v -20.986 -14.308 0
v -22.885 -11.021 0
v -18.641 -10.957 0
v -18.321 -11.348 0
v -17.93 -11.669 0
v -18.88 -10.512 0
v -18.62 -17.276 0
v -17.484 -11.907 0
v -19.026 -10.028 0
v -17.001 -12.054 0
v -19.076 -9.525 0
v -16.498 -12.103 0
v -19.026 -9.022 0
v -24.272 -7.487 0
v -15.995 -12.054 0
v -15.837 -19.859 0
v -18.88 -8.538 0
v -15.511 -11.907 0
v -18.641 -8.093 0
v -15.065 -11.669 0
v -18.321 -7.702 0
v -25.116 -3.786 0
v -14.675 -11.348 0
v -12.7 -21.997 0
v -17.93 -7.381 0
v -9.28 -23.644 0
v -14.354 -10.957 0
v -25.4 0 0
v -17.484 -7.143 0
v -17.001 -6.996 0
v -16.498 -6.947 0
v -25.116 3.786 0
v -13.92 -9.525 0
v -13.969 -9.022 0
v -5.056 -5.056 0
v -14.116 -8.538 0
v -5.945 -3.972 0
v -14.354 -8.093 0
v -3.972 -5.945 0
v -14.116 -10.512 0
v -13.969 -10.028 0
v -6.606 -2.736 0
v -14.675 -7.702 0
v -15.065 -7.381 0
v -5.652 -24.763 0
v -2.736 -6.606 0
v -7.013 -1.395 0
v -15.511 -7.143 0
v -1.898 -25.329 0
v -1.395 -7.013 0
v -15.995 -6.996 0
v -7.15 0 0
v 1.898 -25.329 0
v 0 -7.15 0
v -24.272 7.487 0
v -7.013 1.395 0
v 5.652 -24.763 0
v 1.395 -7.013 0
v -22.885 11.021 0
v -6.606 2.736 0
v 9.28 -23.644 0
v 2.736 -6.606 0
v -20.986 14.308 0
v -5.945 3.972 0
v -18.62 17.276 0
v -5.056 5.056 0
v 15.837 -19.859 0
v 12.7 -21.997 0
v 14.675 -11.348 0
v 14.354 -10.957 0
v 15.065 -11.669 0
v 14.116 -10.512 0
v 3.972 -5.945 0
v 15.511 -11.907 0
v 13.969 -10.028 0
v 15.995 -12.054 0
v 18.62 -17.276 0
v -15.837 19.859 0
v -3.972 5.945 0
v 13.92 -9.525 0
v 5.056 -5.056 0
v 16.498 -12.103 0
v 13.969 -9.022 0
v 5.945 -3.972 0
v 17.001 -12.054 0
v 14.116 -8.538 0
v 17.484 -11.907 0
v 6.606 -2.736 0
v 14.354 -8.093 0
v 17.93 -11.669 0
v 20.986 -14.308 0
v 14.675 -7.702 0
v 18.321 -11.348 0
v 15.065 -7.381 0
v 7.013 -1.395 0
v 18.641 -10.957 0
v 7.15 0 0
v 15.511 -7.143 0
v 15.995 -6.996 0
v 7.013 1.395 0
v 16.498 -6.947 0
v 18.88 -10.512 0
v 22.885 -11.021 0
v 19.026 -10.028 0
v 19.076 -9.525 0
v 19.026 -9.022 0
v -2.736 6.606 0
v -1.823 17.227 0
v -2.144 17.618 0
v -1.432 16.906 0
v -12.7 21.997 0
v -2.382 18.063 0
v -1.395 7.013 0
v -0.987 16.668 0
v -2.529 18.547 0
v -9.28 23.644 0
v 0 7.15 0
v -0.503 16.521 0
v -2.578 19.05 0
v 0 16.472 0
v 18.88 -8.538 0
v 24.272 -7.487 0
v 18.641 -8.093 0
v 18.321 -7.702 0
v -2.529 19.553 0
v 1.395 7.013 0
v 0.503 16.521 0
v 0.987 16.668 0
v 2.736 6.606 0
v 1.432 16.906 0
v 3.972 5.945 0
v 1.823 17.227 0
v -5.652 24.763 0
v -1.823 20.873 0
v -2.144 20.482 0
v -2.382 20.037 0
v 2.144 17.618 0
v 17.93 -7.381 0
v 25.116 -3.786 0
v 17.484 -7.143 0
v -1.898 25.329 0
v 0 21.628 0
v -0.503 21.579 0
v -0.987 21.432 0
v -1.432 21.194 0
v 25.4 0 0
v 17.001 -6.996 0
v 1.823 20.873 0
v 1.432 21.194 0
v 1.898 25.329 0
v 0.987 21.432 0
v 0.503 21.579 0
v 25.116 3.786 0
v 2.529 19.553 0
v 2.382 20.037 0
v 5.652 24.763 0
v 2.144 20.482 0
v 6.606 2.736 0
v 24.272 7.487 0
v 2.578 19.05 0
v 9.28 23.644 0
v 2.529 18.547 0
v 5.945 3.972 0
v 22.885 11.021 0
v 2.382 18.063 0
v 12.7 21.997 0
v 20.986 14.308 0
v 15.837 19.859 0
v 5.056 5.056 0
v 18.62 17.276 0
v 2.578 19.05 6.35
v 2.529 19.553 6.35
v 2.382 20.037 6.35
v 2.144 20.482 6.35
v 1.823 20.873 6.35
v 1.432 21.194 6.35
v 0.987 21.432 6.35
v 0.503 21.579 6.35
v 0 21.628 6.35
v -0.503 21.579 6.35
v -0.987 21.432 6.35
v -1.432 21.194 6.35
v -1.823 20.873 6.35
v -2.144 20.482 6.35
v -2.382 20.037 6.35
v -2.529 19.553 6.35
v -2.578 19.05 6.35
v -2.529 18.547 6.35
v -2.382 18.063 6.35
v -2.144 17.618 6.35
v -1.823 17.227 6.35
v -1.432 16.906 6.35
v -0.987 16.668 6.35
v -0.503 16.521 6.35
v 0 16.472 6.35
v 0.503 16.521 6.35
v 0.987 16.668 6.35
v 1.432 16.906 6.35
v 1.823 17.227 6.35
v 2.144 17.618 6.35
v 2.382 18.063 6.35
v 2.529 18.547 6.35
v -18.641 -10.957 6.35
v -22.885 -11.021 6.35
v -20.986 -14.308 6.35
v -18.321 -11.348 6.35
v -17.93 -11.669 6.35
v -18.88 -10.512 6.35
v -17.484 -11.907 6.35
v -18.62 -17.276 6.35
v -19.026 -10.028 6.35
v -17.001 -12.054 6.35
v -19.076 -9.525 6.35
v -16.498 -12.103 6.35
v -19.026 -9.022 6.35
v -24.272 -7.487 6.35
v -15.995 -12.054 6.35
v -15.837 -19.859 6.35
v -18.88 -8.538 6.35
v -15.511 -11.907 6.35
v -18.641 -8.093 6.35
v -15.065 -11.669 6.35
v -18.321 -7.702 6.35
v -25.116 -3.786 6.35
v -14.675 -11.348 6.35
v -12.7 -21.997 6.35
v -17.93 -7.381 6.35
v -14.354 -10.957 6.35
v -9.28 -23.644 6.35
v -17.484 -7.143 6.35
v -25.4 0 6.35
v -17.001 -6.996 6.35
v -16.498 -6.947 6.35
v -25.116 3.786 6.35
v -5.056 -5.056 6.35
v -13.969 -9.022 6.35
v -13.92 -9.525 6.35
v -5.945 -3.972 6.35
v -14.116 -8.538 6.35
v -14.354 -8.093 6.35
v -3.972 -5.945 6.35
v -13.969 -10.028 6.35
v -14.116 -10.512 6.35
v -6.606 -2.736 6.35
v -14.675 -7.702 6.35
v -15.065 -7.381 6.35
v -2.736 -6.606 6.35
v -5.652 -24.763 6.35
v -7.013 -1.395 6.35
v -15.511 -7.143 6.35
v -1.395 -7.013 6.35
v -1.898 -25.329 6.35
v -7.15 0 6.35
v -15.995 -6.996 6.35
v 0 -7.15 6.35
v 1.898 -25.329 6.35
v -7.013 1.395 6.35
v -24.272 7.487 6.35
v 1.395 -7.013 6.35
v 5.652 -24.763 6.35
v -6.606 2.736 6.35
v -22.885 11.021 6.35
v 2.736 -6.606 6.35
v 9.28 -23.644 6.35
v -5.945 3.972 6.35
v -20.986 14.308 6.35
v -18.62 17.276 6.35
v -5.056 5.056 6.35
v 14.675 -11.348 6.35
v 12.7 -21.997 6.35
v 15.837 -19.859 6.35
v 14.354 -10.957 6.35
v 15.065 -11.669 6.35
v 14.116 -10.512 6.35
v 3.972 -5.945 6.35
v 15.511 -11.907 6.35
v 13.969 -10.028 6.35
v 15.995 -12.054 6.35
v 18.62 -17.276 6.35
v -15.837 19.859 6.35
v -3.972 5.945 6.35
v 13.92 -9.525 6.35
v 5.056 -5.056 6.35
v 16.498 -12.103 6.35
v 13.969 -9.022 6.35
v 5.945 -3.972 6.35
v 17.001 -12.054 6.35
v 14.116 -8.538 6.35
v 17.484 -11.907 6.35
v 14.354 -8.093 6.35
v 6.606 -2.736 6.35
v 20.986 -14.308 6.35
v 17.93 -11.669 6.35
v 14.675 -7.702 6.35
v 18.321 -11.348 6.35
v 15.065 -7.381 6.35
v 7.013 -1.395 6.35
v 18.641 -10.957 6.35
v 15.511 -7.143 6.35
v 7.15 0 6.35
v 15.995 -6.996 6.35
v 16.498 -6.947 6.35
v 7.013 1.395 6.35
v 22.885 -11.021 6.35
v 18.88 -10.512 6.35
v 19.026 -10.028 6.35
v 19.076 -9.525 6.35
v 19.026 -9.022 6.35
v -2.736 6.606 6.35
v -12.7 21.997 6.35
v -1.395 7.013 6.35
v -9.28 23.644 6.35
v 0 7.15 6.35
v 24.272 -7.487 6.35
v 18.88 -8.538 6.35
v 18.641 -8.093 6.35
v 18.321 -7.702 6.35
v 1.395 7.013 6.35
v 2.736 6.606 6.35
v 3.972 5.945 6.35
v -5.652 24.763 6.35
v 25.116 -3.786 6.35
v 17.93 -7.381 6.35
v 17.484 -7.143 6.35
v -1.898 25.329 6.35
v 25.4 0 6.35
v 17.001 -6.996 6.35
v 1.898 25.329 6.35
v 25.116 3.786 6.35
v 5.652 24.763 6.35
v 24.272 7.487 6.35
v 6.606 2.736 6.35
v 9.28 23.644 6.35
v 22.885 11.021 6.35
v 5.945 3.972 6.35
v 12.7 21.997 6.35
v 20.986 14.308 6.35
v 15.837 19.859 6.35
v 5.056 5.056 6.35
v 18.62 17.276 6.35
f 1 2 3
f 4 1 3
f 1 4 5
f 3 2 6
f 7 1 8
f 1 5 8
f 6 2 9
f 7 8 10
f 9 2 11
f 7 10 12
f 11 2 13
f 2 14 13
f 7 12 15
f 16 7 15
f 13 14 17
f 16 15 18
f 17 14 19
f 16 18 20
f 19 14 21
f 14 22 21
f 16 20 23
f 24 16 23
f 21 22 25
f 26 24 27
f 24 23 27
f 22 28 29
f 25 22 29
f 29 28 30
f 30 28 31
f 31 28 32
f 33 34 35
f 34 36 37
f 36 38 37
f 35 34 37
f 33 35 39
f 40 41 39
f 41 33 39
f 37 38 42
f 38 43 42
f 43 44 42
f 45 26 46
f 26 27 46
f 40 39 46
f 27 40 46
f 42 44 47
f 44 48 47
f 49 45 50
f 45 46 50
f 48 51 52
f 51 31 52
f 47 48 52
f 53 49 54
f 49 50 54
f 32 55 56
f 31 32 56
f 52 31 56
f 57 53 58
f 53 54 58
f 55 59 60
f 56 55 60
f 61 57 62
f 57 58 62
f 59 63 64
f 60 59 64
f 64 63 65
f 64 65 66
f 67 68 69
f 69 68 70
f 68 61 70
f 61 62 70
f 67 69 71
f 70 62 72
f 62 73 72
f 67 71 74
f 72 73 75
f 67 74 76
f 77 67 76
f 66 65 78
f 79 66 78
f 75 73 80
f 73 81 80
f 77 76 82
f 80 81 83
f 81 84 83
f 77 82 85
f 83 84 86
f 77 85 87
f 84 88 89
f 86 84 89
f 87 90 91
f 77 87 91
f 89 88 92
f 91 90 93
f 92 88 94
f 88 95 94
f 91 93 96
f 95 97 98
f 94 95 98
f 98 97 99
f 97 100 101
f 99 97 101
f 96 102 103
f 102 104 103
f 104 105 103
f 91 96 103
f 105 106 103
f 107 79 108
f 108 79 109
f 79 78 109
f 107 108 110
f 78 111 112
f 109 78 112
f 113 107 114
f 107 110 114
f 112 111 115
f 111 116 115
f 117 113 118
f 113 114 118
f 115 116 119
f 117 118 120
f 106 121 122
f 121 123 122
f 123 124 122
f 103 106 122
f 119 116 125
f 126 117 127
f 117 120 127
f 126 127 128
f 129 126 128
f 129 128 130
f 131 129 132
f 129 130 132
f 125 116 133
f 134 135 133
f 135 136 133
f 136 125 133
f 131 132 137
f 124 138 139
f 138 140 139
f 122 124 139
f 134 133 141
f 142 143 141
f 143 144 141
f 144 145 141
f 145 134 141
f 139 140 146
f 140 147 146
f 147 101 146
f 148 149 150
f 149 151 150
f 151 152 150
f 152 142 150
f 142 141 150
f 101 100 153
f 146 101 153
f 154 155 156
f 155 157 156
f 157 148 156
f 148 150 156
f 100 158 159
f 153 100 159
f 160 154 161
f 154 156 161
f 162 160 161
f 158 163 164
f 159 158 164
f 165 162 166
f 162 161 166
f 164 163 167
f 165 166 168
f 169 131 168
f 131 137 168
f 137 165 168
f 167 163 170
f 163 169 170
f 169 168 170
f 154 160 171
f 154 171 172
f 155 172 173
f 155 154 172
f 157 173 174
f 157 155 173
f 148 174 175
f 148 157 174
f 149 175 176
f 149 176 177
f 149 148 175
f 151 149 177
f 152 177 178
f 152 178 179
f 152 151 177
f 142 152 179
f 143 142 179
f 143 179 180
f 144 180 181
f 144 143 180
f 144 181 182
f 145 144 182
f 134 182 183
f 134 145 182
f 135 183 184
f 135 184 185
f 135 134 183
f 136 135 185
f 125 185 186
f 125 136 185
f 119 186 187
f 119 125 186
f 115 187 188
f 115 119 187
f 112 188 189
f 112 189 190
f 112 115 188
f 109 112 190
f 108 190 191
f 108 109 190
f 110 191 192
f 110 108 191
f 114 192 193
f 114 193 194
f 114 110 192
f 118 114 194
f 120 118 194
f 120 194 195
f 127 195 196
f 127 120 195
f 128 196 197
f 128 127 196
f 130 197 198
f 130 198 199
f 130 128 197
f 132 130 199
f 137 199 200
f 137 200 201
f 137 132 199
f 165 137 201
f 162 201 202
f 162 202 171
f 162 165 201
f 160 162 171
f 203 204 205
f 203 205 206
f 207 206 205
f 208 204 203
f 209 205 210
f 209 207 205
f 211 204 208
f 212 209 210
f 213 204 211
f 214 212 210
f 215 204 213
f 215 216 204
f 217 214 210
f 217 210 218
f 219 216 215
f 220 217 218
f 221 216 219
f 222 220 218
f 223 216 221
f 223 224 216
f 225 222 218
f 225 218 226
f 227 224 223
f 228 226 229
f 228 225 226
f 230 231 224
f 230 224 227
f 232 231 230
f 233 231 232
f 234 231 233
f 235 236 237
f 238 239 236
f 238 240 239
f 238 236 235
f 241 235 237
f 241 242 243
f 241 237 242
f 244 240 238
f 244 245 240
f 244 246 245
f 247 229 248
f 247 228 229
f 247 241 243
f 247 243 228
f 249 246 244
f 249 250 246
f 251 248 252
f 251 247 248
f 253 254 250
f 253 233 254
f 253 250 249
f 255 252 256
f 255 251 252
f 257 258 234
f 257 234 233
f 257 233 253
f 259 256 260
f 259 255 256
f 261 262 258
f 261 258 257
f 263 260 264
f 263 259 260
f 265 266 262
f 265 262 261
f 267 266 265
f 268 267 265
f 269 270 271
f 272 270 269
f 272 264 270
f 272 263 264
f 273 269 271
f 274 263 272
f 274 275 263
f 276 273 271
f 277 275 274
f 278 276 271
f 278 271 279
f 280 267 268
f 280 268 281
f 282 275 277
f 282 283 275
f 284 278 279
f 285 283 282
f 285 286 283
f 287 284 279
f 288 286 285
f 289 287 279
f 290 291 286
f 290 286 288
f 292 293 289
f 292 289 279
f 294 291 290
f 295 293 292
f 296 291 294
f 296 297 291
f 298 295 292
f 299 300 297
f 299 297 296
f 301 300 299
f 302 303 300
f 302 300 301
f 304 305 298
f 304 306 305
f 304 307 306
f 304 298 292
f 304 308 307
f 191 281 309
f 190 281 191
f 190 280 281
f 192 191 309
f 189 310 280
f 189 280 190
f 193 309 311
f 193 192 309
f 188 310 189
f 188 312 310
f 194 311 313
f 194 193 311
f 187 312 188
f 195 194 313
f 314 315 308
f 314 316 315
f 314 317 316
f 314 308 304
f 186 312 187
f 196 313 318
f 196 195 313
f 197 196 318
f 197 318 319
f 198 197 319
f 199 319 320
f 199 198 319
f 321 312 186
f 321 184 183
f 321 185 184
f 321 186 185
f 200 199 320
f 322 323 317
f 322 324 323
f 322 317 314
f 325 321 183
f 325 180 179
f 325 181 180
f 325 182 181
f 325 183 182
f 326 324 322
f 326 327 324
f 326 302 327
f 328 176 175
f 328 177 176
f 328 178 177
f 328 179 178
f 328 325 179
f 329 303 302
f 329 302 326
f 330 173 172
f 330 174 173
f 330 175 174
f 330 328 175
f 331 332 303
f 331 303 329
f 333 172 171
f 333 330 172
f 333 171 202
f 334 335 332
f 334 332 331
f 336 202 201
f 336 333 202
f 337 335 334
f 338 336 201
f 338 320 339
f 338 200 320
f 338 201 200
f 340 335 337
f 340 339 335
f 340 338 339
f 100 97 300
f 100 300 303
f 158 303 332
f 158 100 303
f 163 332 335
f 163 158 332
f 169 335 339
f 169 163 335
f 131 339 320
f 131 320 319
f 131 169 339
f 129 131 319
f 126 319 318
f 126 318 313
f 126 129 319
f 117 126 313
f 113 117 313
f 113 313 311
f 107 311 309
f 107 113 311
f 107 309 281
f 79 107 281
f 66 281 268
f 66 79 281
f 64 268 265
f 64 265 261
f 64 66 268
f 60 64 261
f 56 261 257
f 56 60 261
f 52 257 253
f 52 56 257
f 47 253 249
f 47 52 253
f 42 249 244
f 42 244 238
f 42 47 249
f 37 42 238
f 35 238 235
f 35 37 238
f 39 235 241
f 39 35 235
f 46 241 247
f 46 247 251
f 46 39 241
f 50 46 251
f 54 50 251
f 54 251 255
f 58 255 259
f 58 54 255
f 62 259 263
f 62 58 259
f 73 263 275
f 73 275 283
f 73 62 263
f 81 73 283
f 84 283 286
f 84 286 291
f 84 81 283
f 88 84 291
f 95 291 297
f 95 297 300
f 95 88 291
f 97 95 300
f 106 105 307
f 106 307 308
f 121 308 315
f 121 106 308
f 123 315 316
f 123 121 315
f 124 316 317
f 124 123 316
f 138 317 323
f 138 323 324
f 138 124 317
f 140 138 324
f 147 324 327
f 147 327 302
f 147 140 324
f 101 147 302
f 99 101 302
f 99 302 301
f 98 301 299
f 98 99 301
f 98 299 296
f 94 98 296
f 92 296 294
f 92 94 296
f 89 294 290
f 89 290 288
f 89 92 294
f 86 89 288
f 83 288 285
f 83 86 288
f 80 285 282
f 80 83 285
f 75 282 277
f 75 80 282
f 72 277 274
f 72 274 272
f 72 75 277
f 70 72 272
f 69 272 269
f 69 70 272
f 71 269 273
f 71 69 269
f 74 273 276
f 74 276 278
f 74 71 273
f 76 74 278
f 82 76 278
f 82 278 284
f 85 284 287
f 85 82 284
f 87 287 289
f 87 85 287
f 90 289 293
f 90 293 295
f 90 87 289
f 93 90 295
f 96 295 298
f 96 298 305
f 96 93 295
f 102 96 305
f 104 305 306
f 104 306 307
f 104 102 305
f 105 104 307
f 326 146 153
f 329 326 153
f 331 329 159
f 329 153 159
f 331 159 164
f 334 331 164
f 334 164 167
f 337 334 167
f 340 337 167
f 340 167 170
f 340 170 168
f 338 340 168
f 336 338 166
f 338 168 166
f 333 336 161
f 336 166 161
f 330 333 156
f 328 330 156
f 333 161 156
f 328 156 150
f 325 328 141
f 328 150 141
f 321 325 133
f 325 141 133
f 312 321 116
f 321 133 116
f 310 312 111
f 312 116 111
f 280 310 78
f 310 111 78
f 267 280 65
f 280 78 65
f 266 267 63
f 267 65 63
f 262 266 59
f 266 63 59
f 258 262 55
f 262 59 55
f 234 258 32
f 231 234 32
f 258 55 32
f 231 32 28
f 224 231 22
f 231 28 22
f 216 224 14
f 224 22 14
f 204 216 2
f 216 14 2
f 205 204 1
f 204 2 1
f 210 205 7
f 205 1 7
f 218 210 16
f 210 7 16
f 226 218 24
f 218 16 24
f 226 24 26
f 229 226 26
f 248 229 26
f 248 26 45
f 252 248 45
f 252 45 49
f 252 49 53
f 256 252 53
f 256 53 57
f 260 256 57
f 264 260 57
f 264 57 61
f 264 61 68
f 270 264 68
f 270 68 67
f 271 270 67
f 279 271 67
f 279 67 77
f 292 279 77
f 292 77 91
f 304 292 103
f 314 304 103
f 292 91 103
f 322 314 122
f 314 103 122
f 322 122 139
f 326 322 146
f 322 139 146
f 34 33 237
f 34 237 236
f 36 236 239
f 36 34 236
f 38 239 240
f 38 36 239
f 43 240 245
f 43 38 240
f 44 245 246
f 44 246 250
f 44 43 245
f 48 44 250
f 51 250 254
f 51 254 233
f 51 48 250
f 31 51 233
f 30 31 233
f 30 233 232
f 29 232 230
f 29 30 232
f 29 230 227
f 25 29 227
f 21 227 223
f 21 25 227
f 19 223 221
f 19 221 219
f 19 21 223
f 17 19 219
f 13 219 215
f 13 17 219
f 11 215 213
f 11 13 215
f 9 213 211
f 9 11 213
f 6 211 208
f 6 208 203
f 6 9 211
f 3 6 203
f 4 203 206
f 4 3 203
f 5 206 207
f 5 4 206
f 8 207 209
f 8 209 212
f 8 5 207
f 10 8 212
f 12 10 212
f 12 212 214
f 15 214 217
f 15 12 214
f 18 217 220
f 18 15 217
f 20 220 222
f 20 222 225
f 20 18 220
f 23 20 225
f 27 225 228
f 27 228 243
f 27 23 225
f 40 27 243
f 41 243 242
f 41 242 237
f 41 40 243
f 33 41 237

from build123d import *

# Parameters (mm, degrees)
SKETCH1_R           = 25.4
BOSS_EXTRUDE1_DEPTH = 6.35
SKETCH1_3_R         = 2.5781
CUT_EXTRUDE1_DEPTH  = 6.35
SKETCH1_5_R         = 7.1501
CUT_EXTRUDE2_DEPTH  = 6.35


with BuildPart() as part:
    # Sketch1 → Boss-Extrude1 (new body)
    with BuildSketch(Plane.XY):
        Circle(SKETCH1_R)
    extrude(amount=BOSS_EXTRUDE1_DEPTH)

    # Sketch1<3> → Cut-Extrude1 (cut)
    with BuildSketch(Plane.XY):
        with Locations((0, 19.05)):
            Circle(SKETCH1_3_R)
        with Locations((16.497783942, -9.525)):
            Circle(SKETCH1_3_R)
        with Locations((-16.497783942, -9.525)):
            Circle(SKETCH1_3_R)
    extrude(amount=CUT_EXTRUDE1_DEPTH, mode=Mode.SUBTRACT)

    # Sketch1<5> → Cut-Extrude2 (cut)
    with BuildSketch(Plane.XY):
        Circle(SKETCH1_5_R)
    extrude(amount=CUT_EXTRUDE2_DEPTH, mode=Mode.SUBTRACT)


solid = part.part
